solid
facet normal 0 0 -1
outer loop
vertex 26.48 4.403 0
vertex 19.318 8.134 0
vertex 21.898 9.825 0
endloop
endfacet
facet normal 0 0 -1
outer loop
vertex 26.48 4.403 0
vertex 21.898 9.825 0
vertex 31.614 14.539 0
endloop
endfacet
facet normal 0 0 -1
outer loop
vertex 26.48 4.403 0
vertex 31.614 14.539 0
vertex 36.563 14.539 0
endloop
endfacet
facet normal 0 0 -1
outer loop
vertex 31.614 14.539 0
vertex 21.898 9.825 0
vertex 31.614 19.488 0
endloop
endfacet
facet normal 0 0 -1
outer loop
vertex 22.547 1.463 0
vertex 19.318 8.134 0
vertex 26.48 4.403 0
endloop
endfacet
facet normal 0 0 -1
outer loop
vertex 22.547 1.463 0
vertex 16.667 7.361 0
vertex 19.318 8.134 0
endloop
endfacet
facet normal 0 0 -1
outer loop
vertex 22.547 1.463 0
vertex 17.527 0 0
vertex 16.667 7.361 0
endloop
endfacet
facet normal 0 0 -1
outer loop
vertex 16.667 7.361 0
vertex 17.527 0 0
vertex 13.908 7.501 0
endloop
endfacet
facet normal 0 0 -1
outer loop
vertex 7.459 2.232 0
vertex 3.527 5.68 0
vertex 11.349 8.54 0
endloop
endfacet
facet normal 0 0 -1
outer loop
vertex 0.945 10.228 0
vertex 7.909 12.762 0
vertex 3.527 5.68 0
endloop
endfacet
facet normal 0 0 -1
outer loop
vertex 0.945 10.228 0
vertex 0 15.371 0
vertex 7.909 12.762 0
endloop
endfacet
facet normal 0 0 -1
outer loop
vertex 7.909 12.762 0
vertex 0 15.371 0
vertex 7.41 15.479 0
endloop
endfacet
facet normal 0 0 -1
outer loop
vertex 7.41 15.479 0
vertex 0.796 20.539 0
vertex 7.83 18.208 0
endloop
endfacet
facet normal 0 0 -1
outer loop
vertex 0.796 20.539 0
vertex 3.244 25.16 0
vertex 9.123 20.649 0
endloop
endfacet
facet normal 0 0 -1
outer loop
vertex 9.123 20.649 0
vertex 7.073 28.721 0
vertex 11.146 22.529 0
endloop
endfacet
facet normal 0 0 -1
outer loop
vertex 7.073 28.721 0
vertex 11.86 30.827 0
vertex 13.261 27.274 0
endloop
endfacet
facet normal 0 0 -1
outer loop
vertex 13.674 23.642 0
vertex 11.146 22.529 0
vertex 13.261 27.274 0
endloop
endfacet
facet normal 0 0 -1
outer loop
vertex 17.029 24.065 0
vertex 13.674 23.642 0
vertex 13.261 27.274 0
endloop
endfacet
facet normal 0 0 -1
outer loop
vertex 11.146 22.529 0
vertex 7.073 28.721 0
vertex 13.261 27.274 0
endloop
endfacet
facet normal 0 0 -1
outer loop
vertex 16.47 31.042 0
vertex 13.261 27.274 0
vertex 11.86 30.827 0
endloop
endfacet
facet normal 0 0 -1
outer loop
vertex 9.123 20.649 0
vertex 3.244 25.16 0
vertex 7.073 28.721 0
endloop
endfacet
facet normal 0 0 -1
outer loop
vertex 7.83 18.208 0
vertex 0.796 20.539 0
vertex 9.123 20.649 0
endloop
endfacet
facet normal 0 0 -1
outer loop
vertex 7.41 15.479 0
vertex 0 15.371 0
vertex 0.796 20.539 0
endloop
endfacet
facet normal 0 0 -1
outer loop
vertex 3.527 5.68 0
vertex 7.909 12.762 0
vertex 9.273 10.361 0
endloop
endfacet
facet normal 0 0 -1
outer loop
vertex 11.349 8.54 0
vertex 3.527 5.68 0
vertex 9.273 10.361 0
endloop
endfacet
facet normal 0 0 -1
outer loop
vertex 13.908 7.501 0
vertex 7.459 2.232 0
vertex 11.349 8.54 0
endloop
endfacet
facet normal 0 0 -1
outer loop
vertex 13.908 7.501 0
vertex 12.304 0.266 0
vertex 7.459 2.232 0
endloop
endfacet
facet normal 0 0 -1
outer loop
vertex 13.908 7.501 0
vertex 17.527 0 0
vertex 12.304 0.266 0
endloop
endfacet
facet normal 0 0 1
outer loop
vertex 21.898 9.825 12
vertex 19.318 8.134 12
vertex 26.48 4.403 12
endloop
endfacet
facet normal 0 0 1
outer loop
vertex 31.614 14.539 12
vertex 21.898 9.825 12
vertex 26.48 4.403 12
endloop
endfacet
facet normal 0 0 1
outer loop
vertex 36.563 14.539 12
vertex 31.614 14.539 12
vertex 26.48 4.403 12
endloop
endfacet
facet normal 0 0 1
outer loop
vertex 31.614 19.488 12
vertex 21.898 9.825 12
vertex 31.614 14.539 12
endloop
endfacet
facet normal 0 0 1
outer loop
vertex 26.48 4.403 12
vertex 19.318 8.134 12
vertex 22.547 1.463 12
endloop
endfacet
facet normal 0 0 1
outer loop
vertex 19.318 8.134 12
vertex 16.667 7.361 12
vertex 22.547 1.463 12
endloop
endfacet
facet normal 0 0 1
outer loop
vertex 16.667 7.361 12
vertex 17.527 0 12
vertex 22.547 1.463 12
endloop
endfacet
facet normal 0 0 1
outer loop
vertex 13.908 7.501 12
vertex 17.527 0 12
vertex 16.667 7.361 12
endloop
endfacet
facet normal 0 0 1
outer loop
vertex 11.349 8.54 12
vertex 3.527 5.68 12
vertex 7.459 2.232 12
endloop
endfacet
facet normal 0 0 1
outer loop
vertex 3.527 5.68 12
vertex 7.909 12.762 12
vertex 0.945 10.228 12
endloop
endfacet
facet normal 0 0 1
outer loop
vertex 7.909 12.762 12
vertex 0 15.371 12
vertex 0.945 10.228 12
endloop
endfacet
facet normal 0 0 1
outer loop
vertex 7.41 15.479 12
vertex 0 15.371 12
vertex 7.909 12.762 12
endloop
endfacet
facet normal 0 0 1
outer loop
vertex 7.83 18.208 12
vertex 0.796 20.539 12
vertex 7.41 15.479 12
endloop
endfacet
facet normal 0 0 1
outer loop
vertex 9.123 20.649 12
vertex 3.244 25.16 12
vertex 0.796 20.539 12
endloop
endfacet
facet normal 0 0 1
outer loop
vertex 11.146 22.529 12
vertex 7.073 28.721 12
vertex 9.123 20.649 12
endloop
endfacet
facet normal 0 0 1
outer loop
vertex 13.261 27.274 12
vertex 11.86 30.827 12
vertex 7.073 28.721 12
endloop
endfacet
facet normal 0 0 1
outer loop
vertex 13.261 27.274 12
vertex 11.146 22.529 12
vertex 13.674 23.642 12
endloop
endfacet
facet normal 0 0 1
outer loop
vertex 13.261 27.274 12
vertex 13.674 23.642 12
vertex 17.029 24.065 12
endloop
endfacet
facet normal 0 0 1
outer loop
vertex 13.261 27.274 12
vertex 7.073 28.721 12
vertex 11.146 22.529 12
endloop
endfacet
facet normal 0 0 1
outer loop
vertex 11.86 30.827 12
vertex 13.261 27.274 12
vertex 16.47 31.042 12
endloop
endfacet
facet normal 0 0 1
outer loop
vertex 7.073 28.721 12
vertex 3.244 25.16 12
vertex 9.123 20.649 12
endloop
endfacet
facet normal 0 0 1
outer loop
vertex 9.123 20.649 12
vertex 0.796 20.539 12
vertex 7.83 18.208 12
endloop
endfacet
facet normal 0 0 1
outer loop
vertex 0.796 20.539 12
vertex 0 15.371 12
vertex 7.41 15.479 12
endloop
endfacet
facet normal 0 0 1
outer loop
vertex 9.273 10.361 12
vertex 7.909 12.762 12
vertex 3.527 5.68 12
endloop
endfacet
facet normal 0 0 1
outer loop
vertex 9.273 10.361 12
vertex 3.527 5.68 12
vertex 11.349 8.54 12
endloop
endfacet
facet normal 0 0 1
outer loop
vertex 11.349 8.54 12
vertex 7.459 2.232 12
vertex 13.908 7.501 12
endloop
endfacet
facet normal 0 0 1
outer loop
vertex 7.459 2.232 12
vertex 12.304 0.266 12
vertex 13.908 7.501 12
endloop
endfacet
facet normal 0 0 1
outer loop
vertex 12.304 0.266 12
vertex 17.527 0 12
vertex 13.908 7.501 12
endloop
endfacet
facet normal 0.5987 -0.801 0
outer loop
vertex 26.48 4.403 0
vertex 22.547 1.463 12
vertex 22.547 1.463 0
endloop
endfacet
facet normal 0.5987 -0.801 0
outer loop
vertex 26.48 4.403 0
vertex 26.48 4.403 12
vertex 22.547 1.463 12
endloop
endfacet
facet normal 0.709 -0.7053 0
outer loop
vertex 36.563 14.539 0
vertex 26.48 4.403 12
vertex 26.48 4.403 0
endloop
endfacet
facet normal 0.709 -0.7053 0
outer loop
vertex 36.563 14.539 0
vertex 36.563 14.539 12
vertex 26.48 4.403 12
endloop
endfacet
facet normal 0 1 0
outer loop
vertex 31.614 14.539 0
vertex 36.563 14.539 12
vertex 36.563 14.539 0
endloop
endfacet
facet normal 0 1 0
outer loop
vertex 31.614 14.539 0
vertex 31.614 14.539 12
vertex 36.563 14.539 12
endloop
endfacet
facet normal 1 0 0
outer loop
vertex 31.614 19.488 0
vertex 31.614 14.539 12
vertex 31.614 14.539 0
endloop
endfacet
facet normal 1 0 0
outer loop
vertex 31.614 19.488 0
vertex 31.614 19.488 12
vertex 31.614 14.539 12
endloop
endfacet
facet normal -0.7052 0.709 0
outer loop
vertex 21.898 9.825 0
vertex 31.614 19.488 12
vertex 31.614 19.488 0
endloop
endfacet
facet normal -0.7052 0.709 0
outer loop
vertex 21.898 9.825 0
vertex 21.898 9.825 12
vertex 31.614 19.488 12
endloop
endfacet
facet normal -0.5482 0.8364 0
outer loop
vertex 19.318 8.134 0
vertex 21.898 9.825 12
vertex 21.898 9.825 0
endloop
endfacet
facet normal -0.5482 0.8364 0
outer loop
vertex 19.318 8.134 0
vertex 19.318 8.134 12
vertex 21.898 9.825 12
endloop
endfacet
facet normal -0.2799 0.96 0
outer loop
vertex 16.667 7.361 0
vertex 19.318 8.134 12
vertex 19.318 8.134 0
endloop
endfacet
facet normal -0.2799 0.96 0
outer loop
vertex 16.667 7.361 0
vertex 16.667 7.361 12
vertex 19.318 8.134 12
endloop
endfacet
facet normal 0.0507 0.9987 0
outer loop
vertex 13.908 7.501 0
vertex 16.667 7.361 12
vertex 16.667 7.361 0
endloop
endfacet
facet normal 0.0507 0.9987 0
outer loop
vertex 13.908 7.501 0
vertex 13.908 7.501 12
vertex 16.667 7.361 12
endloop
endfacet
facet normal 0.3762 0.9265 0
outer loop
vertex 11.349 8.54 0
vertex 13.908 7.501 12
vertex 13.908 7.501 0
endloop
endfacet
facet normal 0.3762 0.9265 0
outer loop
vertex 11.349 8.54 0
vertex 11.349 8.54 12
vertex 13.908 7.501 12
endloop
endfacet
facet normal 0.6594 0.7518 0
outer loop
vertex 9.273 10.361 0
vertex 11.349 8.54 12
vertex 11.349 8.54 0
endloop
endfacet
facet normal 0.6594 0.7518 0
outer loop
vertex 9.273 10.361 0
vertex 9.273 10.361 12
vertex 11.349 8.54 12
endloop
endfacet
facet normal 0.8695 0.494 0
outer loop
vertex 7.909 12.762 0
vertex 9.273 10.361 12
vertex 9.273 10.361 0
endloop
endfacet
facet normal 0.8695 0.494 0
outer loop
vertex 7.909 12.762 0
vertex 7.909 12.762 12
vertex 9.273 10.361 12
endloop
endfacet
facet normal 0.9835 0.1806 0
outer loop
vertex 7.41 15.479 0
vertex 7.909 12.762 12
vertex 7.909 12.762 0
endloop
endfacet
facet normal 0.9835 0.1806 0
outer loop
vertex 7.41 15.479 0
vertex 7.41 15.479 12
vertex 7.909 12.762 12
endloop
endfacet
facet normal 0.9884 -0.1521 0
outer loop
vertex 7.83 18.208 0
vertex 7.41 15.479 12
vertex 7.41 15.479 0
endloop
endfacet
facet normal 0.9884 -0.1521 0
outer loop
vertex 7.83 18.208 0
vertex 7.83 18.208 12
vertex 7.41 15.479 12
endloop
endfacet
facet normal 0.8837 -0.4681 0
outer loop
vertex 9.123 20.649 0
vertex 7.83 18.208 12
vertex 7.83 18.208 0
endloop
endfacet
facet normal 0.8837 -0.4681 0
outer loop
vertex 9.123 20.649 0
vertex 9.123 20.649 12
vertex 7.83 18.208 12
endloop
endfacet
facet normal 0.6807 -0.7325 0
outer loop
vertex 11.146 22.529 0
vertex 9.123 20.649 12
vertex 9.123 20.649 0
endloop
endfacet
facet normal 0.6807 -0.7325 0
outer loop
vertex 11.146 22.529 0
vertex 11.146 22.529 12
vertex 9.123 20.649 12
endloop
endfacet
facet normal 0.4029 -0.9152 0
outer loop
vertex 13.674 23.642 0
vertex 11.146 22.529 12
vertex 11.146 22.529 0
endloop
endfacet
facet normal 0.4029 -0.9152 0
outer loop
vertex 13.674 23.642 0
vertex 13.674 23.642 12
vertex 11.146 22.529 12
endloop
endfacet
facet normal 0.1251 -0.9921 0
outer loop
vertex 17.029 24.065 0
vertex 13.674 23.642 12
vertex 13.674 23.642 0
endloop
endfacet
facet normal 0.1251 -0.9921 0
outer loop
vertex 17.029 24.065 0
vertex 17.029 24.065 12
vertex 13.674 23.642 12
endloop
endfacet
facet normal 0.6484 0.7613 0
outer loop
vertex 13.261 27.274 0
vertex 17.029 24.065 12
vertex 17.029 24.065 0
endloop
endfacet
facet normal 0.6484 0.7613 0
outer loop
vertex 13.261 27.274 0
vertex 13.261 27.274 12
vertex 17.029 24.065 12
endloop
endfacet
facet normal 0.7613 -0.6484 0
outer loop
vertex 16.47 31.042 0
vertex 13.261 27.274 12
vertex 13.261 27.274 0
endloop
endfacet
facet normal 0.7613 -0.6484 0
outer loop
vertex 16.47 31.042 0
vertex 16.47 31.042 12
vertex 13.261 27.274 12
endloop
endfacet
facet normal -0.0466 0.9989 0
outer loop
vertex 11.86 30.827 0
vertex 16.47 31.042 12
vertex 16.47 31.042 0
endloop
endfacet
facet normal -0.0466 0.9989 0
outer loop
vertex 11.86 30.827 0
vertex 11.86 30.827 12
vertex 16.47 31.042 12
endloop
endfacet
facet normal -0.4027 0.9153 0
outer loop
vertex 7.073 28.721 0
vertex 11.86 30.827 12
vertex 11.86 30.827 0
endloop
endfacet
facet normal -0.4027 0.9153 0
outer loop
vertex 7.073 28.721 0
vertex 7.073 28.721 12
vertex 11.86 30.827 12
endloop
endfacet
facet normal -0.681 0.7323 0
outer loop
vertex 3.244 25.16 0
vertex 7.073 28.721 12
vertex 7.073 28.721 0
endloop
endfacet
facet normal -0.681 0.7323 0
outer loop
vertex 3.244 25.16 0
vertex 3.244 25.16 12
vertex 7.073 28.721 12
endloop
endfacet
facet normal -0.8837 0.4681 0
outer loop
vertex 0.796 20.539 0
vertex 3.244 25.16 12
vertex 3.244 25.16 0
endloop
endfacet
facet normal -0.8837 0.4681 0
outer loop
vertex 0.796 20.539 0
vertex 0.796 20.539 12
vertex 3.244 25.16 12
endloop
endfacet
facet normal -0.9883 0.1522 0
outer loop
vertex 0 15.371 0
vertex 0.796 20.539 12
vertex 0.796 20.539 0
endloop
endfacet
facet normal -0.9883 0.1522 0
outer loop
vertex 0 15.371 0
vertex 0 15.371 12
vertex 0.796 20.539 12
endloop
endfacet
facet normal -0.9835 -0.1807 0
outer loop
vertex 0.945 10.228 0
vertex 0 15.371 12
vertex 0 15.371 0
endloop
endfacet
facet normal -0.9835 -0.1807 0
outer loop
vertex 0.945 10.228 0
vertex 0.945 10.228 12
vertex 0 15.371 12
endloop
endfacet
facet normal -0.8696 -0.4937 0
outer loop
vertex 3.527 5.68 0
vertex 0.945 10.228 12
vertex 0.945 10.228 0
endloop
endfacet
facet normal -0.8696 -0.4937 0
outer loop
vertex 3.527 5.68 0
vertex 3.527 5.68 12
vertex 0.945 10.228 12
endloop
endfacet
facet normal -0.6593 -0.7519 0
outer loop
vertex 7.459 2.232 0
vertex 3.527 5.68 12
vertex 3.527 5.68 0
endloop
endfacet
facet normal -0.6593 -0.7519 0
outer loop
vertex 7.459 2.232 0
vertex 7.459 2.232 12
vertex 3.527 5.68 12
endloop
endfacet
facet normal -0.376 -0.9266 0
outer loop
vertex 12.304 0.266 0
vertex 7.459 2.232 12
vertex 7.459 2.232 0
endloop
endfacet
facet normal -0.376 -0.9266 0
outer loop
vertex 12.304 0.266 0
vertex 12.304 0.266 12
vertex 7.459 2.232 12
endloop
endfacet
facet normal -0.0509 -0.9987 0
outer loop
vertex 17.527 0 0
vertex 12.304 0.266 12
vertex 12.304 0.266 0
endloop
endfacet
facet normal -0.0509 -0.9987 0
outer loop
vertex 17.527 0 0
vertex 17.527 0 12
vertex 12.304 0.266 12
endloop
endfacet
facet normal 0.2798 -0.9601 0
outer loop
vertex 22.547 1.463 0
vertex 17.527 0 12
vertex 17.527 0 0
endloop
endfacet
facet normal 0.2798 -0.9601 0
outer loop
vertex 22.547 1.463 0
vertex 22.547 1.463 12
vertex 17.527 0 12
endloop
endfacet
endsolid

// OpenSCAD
$fn = 32;

// ----------------------------------------------------------------------
// Eye lug: ring_tail, 12 mm thick
// ----------------------------------------------------------------------

// --- parameters (mm) ---
profile_height = 12;      // extrusion height
profile_points = 30;      // points of the closed outline

profile = [[13.261, 27.274], [16.47, 31.042], [11.86, 30.827], [7.073, 28.721], [3.244, 25.16], [0.796, 20.539], [0, 15.371], [0.945, 10.228], [3.527, 5.68], [7.459, 2.232], [12.304, 0.266], [17.527, 0], [22.547, 1.463], [26.48, 4.403], [36.563, 14.539], [31.614, 14.539], [31.614, 19.488], [21.898, 9.825], [19.318, 8.134], [16.667, 7.361], [13.908, 7.501], [11.349, 8.54], [9.273, 10.361], [7.909, 12.762], [7.41, 15.479], [7.83, 18.208], [9.123, 20.649], [11.146, 22.529], [13.674, 23.642], [17.029, 24.065]];  // single closed polygon, 30 points, counter clockwise

// --- the one profile operation ---
linear_extrude(height = profile_height) polygon(points = profile);
